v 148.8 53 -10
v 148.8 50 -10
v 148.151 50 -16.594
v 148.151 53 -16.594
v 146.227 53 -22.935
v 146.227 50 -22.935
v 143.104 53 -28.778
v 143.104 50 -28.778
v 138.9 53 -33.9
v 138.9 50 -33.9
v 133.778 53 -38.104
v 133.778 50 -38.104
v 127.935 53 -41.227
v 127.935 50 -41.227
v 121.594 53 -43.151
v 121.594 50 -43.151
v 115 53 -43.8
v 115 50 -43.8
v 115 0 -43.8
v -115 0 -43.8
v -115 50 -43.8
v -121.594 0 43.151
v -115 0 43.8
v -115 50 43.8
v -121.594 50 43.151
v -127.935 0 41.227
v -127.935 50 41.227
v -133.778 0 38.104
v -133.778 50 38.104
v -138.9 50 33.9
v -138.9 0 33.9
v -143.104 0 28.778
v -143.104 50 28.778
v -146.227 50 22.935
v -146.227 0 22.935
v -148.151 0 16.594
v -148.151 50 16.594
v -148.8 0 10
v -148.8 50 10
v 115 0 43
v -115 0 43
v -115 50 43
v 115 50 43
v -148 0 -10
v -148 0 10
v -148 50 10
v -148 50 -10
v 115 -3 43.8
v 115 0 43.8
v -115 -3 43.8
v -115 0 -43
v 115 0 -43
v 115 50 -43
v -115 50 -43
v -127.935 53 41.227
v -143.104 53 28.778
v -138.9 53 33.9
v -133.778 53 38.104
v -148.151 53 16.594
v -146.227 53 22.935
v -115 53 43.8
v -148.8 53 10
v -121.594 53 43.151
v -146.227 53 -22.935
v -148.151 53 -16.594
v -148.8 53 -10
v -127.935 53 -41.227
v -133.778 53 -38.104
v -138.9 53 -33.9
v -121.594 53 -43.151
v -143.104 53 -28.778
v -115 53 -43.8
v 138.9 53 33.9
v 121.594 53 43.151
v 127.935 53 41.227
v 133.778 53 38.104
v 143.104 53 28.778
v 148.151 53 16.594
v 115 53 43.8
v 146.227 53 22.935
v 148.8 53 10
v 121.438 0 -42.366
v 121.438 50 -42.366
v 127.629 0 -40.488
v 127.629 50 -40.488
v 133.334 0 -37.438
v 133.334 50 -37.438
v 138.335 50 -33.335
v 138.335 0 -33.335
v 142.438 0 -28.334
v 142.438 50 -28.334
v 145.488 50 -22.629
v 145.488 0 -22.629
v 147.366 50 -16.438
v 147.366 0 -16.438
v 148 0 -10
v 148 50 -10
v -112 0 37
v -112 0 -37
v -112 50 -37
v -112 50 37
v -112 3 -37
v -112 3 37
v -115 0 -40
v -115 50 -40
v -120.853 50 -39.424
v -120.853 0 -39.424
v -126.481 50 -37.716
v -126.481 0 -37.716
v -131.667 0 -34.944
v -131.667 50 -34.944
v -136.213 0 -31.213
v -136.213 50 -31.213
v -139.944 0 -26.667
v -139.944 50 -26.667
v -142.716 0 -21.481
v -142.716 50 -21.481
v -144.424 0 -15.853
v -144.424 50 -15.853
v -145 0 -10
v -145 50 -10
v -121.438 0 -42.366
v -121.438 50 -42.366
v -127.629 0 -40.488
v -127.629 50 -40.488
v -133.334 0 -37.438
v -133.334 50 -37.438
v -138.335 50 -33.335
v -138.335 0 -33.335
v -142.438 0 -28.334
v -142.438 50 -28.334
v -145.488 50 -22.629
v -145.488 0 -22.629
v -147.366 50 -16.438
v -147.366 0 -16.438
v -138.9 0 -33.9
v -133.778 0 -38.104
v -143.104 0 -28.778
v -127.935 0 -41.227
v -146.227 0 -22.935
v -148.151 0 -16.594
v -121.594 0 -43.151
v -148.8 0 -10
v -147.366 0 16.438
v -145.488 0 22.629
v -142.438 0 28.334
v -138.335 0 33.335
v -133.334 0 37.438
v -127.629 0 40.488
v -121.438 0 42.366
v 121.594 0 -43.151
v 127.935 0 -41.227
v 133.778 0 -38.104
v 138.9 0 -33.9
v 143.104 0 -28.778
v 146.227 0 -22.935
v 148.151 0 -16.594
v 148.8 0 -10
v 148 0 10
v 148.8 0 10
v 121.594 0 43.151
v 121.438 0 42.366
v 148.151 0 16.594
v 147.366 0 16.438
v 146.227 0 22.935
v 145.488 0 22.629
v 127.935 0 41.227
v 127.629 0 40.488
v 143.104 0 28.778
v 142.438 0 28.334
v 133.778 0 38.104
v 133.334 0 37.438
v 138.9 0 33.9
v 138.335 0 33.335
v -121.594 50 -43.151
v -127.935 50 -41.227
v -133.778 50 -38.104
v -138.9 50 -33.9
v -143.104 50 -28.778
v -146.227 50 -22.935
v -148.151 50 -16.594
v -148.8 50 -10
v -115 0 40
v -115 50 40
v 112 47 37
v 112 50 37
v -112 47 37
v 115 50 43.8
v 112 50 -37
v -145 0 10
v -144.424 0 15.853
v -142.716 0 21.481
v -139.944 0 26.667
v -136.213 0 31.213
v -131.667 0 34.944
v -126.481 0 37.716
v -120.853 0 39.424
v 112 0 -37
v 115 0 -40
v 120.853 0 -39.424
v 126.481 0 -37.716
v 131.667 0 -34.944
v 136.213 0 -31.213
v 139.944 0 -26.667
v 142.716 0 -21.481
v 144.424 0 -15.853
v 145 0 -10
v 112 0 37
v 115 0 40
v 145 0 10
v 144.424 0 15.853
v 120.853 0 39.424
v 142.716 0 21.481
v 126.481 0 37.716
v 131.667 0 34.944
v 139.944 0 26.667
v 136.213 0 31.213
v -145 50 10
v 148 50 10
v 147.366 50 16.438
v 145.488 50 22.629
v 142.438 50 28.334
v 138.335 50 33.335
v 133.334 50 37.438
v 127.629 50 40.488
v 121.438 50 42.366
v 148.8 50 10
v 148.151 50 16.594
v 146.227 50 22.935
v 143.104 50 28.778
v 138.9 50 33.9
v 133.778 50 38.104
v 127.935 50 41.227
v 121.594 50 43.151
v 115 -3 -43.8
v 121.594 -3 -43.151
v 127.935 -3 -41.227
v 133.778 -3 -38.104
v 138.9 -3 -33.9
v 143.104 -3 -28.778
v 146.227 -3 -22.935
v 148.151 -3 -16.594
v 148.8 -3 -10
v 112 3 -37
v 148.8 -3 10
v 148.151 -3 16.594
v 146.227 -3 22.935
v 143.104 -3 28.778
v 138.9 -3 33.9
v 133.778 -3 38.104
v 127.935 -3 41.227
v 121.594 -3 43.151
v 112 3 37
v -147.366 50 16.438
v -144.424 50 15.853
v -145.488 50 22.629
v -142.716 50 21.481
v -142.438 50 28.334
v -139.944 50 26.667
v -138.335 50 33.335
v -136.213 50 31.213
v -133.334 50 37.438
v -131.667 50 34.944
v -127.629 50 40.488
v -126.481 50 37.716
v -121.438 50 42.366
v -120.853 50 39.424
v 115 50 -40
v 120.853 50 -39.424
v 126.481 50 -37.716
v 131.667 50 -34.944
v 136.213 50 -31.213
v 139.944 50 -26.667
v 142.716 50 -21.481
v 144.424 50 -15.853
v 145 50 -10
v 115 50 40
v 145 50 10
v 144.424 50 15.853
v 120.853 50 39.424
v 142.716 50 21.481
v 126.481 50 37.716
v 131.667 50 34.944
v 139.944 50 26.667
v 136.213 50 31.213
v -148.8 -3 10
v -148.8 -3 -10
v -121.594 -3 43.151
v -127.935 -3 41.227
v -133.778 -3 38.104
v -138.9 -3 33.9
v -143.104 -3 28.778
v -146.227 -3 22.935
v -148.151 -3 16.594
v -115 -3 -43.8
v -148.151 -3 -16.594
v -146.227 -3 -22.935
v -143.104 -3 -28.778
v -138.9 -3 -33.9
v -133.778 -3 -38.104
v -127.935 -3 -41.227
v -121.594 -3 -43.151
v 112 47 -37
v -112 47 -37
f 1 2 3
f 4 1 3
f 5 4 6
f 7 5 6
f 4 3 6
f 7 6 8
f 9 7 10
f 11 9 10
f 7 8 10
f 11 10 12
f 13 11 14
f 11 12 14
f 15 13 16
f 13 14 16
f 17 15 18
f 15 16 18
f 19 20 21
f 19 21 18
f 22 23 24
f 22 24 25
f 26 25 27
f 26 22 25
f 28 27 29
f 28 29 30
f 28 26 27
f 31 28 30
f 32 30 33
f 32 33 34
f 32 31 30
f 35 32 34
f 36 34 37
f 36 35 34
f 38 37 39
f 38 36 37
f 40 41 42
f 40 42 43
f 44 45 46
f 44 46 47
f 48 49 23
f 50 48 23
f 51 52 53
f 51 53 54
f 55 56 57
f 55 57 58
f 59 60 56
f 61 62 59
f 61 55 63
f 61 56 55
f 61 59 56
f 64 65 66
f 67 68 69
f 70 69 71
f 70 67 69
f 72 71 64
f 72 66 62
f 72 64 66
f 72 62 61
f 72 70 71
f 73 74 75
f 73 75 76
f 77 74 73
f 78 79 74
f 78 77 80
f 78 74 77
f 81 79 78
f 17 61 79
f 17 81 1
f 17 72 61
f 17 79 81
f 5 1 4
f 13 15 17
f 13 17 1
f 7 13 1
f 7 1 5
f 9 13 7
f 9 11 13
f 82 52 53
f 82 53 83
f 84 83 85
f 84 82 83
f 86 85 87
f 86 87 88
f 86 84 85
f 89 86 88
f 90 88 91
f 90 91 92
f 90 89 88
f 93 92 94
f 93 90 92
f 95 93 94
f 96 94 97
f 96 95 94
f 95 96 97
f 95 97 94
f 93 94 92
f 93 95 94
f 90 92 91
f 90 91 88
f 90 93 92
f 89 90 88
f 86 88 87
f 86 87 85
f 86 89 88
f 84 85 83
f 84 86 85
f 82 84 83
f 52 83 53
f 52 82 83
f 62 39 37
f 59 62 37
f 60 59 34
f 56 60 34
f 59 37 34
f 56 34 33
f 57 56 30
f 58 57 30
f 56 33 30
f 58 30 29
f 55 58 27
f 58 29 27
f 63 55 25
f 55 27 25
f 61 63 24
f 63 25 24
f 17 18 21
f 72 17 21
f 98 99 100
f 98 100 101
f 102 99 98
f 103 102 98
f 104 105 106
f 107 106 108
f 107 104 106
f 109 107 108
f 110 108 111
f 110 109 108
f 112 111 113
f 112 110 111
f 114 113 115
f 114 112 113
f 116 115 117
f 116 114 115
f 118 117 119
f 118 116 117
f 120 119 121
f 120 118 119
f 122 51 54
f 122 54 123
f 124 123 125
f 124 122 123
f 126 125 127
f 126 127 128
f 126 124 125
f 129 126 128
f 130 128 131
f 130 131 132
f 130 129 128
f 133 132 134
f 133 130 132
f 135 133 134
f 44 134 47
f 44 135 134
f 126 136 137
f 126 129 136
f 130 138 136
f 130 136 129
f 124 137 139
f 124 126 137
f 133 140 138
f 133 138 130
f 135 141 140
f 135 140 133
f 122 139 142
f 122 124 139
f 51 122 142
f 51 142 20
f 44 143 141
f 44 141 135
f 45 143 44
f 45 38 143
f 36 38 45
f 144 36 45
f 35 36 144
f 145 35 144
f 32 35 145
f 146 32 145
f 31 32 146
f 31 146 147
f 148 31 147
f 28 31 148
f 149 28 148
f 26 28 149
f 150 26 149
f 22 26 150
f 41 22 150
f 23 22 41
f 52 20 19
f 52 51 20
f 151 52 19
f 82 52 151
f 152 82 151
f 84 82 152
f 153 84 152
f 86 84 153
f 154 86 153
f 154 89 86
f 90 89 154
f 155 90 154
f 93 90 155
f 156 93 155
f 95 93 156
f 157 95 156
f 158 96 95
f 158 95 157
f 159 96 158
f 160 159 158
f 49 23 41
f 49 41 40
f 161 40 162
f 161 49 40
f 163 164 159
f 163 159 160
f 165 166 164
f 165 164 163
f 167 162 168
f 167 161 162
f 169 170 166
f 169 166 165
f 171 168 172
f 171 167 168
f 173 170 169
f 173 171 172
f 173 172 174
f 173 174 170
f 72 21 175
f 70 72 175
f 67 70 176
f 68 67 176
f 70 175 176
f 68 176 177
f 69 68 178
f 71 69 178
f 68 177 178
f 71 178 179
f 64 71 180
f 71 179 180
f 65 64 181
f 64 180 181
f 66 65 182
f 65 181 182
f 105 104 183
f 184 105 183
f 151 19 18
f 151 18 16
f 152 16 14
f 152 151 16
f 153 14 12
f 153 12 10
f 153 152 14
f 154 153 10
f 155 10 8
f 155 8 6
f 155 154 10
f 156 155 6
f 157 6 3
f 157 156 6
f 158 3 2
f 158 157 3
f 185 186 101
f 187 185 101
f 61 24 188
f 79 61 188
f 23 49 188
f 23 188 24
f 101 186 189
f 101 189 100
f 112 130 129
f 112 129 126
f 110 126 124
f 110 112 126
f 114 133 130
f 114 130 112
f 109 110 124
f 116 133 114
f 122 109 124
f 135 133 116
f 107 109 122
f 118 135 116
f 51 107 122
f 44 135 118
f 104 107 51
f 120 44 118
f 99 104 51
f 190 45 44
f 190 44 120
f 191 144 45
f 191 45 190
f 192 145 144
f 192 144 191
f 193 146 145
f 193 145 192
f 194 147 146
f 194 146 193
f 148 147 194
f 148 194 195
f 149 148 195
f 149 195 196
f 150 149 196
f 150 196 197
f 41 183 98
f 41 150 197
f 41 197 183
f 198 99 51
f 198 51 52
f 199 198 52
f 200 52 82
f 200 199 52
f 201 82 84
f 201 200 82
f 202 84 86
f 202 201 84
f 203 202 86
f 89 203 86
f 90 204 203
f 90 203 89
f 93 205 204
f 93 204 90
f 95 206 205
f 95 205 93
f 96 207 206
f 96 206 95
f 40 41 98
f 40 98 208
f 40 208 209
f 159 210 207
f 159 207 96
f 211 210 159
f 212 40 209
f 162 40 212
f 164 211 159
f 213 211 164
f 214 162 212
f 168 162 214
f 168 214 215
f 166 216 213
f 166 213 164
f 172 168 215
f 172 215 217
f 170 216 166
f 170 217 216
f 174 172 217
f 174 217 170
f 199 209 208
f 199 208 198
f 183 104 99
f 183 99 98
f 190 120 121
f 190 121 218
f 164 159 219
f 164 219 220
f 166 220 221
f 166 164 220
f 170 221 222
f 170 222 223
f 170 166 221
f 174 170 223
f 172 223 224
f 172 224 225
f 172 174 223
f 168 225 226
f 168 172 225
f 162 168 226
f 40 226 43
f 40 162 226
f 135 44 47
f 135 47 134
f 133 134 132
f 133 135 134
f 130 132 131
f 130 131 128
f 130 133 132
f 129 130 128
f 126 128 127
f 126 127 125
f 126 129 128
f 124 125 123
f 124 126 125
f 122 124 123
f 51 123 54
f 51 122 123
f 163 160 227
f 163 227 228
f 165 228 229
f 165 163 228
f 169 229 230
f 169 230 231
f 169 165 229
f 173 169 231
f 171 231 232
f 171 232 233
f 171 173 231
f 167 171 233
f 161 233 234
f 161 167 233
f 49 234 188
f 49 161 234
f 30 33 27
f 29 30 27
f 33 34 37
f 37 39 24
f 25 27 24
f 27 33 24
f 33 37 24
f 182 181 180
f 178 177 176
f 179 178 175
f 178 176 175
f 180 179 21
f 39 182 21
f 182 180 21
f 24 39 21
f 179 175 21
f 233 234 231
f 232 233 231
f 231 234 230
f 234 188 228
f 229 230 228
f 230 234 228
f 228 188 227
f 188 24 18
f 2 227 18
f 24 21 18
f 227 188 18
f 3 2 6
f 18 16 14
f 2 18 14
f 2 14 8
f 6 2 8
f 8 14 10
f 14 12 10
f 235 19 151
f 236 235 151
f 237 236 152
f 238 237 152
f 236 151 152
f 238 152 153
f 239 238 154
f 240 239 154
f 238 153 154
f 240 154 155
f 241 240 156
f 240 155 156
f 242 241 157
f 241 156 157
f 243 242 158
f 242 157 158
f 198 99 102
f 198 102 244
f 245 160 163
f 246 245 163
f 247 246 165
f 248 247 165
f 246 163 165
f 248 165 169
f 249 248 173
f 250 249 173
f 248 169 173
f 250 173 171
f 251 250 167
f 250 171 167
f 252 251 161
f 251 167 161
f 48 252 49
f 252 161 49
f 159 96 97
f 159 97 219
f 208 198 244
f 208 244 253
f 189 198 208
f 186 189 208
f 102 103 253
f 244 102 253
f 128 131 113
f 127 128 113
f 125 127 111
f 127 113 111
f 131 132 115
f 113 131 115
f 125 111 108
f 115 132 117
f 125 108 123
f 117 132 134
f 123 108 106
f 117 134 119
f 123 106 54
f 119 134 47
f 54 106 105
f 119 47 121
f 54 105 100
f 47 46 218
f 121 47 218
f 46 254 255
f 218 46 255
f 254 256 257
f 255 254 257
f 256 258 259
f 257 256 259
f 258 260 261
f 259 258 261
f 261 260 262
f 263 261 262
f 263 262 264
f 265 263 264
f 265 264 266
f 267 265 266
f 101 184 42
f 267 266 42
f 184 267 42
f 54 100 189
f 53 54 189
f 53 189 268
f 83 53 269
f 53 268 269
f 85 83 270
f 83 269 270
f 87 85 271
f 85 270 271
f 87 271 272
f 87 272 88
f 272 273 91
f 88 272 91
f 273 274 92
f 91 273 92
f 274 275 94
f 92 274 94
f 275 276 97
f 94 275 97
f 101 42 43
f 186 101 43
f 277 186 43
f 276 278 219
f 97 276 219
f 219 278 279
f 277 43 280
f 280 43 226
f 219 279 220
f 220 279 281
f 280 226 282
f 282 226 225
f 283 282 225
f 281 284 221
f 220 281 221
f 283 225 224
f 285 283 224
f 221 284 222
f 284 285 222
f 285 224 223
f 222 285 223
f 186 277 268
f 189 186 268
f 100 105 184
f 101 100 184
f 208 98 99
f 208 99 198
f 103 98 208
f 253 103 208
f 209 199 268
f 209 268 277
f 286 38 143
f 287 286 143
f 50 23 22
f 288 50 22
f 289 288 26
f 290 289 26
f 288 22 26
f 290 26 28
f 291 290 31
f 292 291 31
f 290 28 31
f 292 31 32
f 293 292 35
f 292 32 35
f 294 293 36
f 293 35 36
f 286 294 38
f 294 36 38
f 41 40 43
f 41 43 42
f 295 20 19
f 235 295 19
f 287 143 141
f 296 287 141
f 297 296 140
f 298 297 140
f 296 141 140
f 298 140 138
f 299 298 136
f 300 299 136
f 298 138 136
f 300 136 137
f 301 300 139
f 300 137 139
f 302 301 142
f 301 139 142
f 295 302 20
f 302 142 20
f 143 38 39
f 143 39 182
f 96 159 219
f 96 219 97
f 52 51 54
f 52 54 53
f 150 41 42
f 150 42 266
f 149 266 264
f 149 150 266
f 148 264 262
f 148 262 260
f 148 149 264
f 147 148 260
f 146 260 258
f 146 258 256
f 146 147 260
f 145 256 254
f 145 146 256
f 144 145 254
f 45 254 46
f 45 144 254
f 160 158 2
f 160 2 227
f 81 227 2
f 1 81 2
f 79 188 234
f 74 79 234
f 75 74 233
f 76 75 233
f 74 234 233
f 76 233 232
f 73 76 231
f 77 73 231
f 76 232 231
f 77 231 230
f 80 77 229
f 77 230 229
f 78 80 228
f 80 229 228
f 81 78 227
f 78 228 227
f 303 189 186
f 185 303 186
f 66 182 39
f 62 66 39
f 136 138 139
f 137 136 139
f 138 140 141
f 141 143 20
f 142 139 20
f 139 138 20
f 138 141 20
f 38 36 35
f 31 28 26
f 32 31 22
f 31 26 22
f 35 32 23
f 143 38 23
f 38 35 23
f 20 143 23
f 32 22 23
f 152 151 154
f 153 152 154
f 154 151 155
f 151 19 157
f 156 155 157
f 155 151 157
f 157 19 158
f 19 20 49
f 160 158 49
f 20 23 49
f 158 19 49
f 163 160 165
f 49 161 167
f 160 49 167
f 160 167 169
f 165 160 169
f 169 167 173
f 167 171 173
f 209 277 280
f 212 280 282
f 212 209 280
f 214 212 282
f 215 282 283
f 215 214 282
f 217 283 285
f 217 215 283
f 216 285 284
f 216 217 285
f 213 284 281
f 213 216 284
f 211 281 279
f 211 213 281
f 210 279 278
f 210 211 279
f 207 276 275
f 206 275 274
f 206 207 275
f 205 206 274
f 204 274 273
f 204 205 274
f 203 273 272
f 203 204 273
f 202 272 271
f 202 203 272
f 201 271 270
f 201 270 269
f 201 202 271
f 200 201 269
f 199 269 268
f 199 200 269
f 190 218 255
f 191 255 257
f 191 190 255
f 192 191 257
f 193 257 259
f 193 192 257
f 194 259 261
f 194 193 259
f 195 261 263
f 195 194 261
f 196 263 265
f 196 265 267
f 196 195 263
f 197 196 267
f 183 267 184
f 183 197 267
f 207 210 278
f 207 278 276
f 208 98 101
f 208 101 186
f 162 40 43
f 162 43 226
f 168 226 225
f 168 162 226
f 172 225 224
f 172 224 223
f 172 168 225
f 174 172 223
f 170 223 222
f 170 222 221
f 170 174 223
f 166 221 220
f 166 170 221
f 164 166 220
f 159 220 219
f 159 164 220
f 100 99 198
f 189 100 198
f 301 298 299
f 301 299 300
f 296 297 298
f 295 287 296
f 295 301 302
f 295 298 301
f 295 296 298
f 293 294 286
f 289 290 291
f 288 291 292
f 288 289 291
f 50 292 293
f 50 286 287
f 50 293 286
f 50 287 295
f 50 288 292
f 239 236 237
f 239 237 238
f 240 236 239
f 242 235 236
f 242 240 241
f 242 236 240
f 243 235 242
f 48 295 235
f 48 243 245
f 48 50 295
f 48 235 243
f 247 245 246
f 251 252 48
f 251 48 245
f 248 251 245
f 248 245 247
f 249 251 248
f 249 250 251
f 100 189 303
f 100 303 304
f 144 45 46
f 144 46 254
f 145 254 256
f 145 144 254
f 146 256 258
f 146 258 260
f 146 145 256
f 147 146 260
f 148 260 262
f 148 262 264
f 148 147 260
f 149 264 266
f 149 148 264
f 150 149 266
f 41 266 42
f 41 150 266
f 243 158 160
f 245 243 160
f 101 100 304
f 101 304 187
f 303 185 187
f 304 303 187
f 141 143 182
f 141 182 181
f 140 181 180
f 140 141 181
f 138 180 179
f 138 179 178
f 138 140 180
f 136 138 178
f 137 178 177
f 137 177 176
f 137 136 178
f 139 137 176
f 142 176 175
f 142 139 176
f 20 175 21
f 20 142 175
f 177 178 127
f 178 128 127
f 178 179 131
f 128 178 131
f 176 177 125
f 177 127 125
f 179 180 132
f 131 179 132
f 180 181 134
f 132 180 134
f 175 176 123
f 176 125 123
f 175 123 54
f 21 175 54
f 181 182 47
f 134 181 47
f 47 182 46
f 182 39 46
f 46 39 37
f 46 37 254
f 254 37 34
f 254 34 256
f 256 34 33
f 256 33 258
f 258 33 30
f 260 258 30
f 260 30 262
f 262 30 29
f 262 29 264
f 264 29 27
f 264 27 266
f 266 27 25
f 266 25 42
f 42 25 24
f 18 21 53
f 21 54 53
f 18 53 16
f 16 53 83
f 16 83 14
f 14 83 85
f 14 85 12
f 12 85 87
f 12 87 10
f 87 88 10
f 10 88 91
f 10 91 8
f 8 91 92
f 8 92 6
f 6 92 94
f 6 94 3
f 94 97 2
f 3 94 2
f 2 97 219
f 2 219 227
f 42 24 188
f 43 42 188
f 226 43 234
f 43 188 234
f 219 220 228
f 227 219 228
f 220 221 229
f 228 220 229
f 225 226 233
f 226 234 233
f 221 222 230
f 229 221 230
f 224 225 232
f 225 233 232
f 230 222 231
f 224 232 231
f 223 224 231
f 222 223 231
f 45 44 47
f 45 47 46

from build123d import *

# Parameters (mm, degrees)
F0_W     = 230
F0_H     = 80
F0_W_2   = 224
F0_H_2   = 74
F1_DEPTH = 50
F2_DEPTH = 3
F3_DEPTH = 3
F4_DEPTH = 50
F5_W     = 224
F5_H     = 74
F6_DEPTH = 3
F7_DEPTH = 3


with BuildPart() as f1:
    # F0 (on Front) → F1 (new body)
    with BuildSketch(Plane.XZ):
        with BuildLine():
            ThreePointArc((-115, 43), (-138.3345237792, 33.3345237792), (-148, 10))
            Line((-148, 10), (-148, -10))
            ThreePointArc((-148, -10), (-138.3345237792, -33.3345237792), (-115, -43))
            Line((-115, -43), (115, -43))
            ThreePointArc((115, -43), (138.3345237792, -33.3345237792), (148, -10))
            Line((148, -10), (148, 10))
            ThreePointArc((148, 10), (138.3345237792, 33.3345237792), (115, 43))
            Line((115, 43), (-115, 43))
        make_face()
        with BuildLine():
            Line((-115, 40), (115, 40))
            ThreePointArc((115, 40), (136.2132034356, 31.2132034356), (145, 10))
            Line((145, 10), (145, -10))
            ThreePointArc((145, -10), (136.2132034356, -31.2132034356), (115, -40))
            Line((115, -40), (-115, -40))
            ThreePointArc((-115, -40), (-136.2132034356, -31.2132034356), (-145, -10))
            Line((-145, -10), (-145, 10))
            ThreePointArc((-145, 10), (-136.2132034356, 31.2132034356), (-115, 40))
        make_face(mode=Mode.SUBTRACT)
        Rectangle(F0_W, F0_H)
        Rectangle(F0_W_2, F0_H_2, mode=Mode.SUBTRACT)
    extrude(amount=-F1_DEPTH)


with BuildPart() as f2:
    # F0 (on Front) → F2 (new body)
    with BuildSketch(Plane.XZ):
        Rectangle(F0_W_2, F0_H_2)
    extrude(amount=-F2_DEPTH)


with BuildPart() as f3:
    # F0 (on Front) → F3 (new body)
    with BuildSketch(Plane.XZ):
        with BuildLine():
            ThreePointArc((148.8, 10), (138.9002092041, 33.9002092041), (115, 43.8))
            Line((115, 43.8), (-115, 43.8))
            ThreePointArc((-115, 43.8), (-138.9002092041, 33.9002092041), (-148.8, 10))
            Line((-148.8, 10), (-148.8, -10))
            ThreePointArc((-148.8, -10), (-138.9002092041, -33.9002092041), (-115, -43.8))
            Line((-115, -43.8), (115, -43.8))
            ThreePointArc((115, -43.8), (138.9002092041, -33.9002092041), (148.8, -10))
            Line((148.8, -10), (148.8, 10))
        make_face()
        with BuildLine():
            Line((-148, -10), (-148, 10))
            ThreePointArc((-148, 10), (-138.3345237792, 33.3345237792), (-115, 43))
            Line((-115, 43), (115, 43))
            ThreePointArc((115, 43), (138.3345237792, 33.3345237792), (148, 10))
            Line((148, 10), (148, -10))
            ThreePointArc((148, -10), (138.3345237792, -33.3345237792), (115, -43))
            Line((115, -43), (-115, -43))
            ThreePointArc((-115, -43), (-138.3345237792, -33.3345237792), (-148, -10))
        make_face(mode=Mode.SUBTRACT)
        with BuildLine():
            ThreePointArc((-115, 43), (-138.3345237792, 33.3345237792), (-148, 10))
            Line((-148, 10), (-148, -10))
            ThreePointArc((-148, -10), (-138.3345237792, -33.3345237792), (-115, -43))
            Line((-115, -43), (115, -43))
            ThreePointArc((115, -43), (138.3345237792, -33.3345237792), (148, -10))
            Line((148, -10), (148, 10))
            ThreePointArc((148, 10), (138.3345237792, 33.3345237792), (115, 43))
            Line((115, 43), (-115, 43))
        make_face()
        with BuildLine():
            Line((-115, 40), (115, 40))
            ThreePointArc((115, 40), (136.2132034356, 31.2132034356), (145, 10))
            Line((145, 10), (145, -10))
            ThreePointArc((145, -10), (136.2132034356, -31.2132034356), (115, -40))
            Line((115, -40), (-115, -40))
            ThreePointArc((-115, -40), (-136.2132034356, -31.2132034356), (-145, -10))
            Line((-145, -10), (-145, 10))
            ThreePointArc((-145, 10), (-136.2132034356, 31.2132034356), (-115, 40))
        make_face(mode=Mode.SUBTRACT)
        Rectangle(F0_W, F0_H)
        Rectangle(F0_W_2, F0_H_2, mode=Mode.SUBTRACT)
        Rectangle(F0_W_2, F0_H_2)
        with BuildLine():
            Line((-115, -40), (-115, 40))
            ThreePointArc((-115, 40), (-136.2132034356, 31.2132034356), (-145, 10))
            Line((-145, 10), (-145, -10))
            ThreePointArc((-145, -10), (-136.2132034356, -31.2132034356), (-115, -40))
        make_face()
        with BuildLine():
            ThreePointArc((145, 10), (136.2132034356, 31.2132034356), (115, 40))
            Line((115, 40), (115, -40))
            ThreePointArc((115, -40), (136.2132034356, -31.2132034356), (145, -10))
            Line((145, -10), (145, 10))
        make_face()
    extrude(amount=F3_DEPTH)


with BuildPart() as f4:
    # F0 (on Front) → F4 (new body)
    with BuildSketch(Plane.XZ):
        with BuildLine():
            ThreePointArc((148.8, 10), (138.9002092041, 33.9002092041), (115, 43.8))
            Line((115, 43.8), (-115, 43.8))
            ThreePointArc((-115, 43.8), (-138.9002092041, 33.9002092041), (-148.8, 10))
            Line((-148.8, 10), (-148.8, -10))
            ThreePointArc((-148.8, -10), (-138.9002092041, -33.9002092041), (-115, -43.8))
            Line((-115, -43.8), (115, -43.8))
            ThreePointArc((115, -43.8), (138.9002092041, -33.9002092041), (148.8, -10))
            Line((148.8, -10), (148.8, 10))
        make_face()
        with BuildLine():
            Line((-148, -10), (-148, 10))
            ThreePointArc((-148, 10), (-138.3345237792, 33.3345237792), (-115, 43))
            Line((-115, 43), (115, 43))
            ThreePointArc((115, 43), (138.3345237792, 33.3345237792), (148, 10))
            Line((148, 10), (148, -10))
            ThreePointArc((148, -10), (138.3345237792, -33.3345237792), (115, -43))
            Line((115, -43), (-115, -43))
            ThreePointArc((-115, -43), (-138.3345237792, -33.3345237792), (-148, -10))
        make_face(mode=Mode.SUBTRACT)
    extrude(amount=-F4_DEPTH)


with BuildPart() as f6:
    # F5 (on face) → F6 (new body)
    with BuildSketch(Plane(origin=(0, 50, 0), x_dir=(-1, 0, 0), z_dir=(0, 1, 0))):
        Rectangle(F5_W, F5_H)
    extrude(amount=-F6_DEPTH)


with BuildPart() as f7:
    # F5 (on face) + F4_face (on face) → F7 (new body)
    with BuildSketch(Plane(origin=(0, 50, 0), x_dir=(-1, 0, 0), z_dir=(0, 1, 0))):
        with BuildLine():
            Line((148, -10), (148, 10))
            ThreePointArc((148, 10), (138.3345237792, 33.3345237792), (115, 43))
            Line((115, 43), (-115, 43))
            ThreePointArc((-115, 43), (-138.3345237792, 33.3345237792), (-148, 10))
            Line((-148, 10), (-148, -10))
            ThreePointArc((-148, -10), (-138.3345237792, -33.3345237792), (-115, -43))
            Line((-115, -43), (115, -43))
            ThreePointArc((115, -43), (138.3345237792, -33.3345237792), (148, -10))
        make_face()
        with BuildLine():
            Line((-145, -10), (-145, 10))
            ThreePointArc((-145, 10), (-136.2132034356, 31.2132034356), (-115, 40))
            Line((-115, 40), (-115, -40))
            ThreePointArc((-115, -40), (-136.2132034356, -31.2132034356), (-145, -10))
        make_face(mode=Mode.SUBTRACT)
        Rectangle(F5_W, F5_H, mode=Mode.SUBTRACT)
        with BuildLine():
            Line((115, -40), (115, 40))
            ThreePointArc((115, 40), (136.2132034356, 31.2132034356), (145, 10))
            Line((145, 10), (145, -10))
            ThreePointArc((145, -10), (136.2132034356, -31.2132034356), (115, -40))
        make_face(mode=Mode.SUBTRACT)
        Rectangle(F5_W, F5_H)
        with BuildLine():
            ThreePointArc((-115, 40), (-136.2132034356, 31.2132034356), (-145, 10))
            Line((-145, 10), (-145, -10))
            ThreePointArc((-145, -10), (-136.2132034356, -31.2132034356), (-115, -40))
            Line((-115, -40), (-115, 40))
        make_face()
        with BuildLine():
            ThreePointArc((145, 10), (136.2132034356, 31.2132034356), (115, 40))
            Line((115, 40), (115, -40))
            ThreePointArc((115, -40), (136.2132034356, -31.2132034356), (145, -10))
            Line((145, -10), (145, 10))
        make_face()
    with BuildSketch(Plane(origin=(0, 50, 0), x_dir=(1, 0, 0), z_dir=(0, 1, 0))):
        with BuildLine():
            ThreePointArc((148.8, 10), (138.9002092041, 33.9002092041), (115, 43.8))
            Line((115, 43.8), (-115, 43.8))
            ThreePointArc((-115, 43.8), (-138.9002092041, 33.9002092041), (-148.8, 10))
            Line((-148.8, 10), (-148.8, -10))
            ThreePointArc((-148.8, -10), (-138.9002092041, -33.9002092041), (-115, -43.8))
            Line((-115, -43.8), (115, -43.8))
            ThreePointArc((115, -43.8), (138.9002092041, -33.9002092041), (148.8, -10))
            Line((148.8, -10), (148.8, 10))
        make_face()
        with BuildLine():
            ThreePointArc((-148, 10), (-138.3345237792, 33.3345237792), (-115, 43))
            Line((-115, 43), (115, 43))
            ThreePointArc((115, 43), (138.3345237792, 33.3345237792), (148, 10))
            Line((148, 10), (148, -10))
            ThreePointArc((148, -10), (138.3345237792, -33.3345237792), (115, -43))
            Line((115, -43), (-115, -43))
            ThreePointArc((-115, -43), (-138.3345237792, -33.3345237792), (-148, -10))
            Line((-148, -10), (-148, 10))
        make_face(mode=Mode.SUBTRACT)
    extrude(amount=F7_DEPTH)


solid = Compound([f1.part, f2.part, f3.part, f4.part, f6.part, f7.part])
